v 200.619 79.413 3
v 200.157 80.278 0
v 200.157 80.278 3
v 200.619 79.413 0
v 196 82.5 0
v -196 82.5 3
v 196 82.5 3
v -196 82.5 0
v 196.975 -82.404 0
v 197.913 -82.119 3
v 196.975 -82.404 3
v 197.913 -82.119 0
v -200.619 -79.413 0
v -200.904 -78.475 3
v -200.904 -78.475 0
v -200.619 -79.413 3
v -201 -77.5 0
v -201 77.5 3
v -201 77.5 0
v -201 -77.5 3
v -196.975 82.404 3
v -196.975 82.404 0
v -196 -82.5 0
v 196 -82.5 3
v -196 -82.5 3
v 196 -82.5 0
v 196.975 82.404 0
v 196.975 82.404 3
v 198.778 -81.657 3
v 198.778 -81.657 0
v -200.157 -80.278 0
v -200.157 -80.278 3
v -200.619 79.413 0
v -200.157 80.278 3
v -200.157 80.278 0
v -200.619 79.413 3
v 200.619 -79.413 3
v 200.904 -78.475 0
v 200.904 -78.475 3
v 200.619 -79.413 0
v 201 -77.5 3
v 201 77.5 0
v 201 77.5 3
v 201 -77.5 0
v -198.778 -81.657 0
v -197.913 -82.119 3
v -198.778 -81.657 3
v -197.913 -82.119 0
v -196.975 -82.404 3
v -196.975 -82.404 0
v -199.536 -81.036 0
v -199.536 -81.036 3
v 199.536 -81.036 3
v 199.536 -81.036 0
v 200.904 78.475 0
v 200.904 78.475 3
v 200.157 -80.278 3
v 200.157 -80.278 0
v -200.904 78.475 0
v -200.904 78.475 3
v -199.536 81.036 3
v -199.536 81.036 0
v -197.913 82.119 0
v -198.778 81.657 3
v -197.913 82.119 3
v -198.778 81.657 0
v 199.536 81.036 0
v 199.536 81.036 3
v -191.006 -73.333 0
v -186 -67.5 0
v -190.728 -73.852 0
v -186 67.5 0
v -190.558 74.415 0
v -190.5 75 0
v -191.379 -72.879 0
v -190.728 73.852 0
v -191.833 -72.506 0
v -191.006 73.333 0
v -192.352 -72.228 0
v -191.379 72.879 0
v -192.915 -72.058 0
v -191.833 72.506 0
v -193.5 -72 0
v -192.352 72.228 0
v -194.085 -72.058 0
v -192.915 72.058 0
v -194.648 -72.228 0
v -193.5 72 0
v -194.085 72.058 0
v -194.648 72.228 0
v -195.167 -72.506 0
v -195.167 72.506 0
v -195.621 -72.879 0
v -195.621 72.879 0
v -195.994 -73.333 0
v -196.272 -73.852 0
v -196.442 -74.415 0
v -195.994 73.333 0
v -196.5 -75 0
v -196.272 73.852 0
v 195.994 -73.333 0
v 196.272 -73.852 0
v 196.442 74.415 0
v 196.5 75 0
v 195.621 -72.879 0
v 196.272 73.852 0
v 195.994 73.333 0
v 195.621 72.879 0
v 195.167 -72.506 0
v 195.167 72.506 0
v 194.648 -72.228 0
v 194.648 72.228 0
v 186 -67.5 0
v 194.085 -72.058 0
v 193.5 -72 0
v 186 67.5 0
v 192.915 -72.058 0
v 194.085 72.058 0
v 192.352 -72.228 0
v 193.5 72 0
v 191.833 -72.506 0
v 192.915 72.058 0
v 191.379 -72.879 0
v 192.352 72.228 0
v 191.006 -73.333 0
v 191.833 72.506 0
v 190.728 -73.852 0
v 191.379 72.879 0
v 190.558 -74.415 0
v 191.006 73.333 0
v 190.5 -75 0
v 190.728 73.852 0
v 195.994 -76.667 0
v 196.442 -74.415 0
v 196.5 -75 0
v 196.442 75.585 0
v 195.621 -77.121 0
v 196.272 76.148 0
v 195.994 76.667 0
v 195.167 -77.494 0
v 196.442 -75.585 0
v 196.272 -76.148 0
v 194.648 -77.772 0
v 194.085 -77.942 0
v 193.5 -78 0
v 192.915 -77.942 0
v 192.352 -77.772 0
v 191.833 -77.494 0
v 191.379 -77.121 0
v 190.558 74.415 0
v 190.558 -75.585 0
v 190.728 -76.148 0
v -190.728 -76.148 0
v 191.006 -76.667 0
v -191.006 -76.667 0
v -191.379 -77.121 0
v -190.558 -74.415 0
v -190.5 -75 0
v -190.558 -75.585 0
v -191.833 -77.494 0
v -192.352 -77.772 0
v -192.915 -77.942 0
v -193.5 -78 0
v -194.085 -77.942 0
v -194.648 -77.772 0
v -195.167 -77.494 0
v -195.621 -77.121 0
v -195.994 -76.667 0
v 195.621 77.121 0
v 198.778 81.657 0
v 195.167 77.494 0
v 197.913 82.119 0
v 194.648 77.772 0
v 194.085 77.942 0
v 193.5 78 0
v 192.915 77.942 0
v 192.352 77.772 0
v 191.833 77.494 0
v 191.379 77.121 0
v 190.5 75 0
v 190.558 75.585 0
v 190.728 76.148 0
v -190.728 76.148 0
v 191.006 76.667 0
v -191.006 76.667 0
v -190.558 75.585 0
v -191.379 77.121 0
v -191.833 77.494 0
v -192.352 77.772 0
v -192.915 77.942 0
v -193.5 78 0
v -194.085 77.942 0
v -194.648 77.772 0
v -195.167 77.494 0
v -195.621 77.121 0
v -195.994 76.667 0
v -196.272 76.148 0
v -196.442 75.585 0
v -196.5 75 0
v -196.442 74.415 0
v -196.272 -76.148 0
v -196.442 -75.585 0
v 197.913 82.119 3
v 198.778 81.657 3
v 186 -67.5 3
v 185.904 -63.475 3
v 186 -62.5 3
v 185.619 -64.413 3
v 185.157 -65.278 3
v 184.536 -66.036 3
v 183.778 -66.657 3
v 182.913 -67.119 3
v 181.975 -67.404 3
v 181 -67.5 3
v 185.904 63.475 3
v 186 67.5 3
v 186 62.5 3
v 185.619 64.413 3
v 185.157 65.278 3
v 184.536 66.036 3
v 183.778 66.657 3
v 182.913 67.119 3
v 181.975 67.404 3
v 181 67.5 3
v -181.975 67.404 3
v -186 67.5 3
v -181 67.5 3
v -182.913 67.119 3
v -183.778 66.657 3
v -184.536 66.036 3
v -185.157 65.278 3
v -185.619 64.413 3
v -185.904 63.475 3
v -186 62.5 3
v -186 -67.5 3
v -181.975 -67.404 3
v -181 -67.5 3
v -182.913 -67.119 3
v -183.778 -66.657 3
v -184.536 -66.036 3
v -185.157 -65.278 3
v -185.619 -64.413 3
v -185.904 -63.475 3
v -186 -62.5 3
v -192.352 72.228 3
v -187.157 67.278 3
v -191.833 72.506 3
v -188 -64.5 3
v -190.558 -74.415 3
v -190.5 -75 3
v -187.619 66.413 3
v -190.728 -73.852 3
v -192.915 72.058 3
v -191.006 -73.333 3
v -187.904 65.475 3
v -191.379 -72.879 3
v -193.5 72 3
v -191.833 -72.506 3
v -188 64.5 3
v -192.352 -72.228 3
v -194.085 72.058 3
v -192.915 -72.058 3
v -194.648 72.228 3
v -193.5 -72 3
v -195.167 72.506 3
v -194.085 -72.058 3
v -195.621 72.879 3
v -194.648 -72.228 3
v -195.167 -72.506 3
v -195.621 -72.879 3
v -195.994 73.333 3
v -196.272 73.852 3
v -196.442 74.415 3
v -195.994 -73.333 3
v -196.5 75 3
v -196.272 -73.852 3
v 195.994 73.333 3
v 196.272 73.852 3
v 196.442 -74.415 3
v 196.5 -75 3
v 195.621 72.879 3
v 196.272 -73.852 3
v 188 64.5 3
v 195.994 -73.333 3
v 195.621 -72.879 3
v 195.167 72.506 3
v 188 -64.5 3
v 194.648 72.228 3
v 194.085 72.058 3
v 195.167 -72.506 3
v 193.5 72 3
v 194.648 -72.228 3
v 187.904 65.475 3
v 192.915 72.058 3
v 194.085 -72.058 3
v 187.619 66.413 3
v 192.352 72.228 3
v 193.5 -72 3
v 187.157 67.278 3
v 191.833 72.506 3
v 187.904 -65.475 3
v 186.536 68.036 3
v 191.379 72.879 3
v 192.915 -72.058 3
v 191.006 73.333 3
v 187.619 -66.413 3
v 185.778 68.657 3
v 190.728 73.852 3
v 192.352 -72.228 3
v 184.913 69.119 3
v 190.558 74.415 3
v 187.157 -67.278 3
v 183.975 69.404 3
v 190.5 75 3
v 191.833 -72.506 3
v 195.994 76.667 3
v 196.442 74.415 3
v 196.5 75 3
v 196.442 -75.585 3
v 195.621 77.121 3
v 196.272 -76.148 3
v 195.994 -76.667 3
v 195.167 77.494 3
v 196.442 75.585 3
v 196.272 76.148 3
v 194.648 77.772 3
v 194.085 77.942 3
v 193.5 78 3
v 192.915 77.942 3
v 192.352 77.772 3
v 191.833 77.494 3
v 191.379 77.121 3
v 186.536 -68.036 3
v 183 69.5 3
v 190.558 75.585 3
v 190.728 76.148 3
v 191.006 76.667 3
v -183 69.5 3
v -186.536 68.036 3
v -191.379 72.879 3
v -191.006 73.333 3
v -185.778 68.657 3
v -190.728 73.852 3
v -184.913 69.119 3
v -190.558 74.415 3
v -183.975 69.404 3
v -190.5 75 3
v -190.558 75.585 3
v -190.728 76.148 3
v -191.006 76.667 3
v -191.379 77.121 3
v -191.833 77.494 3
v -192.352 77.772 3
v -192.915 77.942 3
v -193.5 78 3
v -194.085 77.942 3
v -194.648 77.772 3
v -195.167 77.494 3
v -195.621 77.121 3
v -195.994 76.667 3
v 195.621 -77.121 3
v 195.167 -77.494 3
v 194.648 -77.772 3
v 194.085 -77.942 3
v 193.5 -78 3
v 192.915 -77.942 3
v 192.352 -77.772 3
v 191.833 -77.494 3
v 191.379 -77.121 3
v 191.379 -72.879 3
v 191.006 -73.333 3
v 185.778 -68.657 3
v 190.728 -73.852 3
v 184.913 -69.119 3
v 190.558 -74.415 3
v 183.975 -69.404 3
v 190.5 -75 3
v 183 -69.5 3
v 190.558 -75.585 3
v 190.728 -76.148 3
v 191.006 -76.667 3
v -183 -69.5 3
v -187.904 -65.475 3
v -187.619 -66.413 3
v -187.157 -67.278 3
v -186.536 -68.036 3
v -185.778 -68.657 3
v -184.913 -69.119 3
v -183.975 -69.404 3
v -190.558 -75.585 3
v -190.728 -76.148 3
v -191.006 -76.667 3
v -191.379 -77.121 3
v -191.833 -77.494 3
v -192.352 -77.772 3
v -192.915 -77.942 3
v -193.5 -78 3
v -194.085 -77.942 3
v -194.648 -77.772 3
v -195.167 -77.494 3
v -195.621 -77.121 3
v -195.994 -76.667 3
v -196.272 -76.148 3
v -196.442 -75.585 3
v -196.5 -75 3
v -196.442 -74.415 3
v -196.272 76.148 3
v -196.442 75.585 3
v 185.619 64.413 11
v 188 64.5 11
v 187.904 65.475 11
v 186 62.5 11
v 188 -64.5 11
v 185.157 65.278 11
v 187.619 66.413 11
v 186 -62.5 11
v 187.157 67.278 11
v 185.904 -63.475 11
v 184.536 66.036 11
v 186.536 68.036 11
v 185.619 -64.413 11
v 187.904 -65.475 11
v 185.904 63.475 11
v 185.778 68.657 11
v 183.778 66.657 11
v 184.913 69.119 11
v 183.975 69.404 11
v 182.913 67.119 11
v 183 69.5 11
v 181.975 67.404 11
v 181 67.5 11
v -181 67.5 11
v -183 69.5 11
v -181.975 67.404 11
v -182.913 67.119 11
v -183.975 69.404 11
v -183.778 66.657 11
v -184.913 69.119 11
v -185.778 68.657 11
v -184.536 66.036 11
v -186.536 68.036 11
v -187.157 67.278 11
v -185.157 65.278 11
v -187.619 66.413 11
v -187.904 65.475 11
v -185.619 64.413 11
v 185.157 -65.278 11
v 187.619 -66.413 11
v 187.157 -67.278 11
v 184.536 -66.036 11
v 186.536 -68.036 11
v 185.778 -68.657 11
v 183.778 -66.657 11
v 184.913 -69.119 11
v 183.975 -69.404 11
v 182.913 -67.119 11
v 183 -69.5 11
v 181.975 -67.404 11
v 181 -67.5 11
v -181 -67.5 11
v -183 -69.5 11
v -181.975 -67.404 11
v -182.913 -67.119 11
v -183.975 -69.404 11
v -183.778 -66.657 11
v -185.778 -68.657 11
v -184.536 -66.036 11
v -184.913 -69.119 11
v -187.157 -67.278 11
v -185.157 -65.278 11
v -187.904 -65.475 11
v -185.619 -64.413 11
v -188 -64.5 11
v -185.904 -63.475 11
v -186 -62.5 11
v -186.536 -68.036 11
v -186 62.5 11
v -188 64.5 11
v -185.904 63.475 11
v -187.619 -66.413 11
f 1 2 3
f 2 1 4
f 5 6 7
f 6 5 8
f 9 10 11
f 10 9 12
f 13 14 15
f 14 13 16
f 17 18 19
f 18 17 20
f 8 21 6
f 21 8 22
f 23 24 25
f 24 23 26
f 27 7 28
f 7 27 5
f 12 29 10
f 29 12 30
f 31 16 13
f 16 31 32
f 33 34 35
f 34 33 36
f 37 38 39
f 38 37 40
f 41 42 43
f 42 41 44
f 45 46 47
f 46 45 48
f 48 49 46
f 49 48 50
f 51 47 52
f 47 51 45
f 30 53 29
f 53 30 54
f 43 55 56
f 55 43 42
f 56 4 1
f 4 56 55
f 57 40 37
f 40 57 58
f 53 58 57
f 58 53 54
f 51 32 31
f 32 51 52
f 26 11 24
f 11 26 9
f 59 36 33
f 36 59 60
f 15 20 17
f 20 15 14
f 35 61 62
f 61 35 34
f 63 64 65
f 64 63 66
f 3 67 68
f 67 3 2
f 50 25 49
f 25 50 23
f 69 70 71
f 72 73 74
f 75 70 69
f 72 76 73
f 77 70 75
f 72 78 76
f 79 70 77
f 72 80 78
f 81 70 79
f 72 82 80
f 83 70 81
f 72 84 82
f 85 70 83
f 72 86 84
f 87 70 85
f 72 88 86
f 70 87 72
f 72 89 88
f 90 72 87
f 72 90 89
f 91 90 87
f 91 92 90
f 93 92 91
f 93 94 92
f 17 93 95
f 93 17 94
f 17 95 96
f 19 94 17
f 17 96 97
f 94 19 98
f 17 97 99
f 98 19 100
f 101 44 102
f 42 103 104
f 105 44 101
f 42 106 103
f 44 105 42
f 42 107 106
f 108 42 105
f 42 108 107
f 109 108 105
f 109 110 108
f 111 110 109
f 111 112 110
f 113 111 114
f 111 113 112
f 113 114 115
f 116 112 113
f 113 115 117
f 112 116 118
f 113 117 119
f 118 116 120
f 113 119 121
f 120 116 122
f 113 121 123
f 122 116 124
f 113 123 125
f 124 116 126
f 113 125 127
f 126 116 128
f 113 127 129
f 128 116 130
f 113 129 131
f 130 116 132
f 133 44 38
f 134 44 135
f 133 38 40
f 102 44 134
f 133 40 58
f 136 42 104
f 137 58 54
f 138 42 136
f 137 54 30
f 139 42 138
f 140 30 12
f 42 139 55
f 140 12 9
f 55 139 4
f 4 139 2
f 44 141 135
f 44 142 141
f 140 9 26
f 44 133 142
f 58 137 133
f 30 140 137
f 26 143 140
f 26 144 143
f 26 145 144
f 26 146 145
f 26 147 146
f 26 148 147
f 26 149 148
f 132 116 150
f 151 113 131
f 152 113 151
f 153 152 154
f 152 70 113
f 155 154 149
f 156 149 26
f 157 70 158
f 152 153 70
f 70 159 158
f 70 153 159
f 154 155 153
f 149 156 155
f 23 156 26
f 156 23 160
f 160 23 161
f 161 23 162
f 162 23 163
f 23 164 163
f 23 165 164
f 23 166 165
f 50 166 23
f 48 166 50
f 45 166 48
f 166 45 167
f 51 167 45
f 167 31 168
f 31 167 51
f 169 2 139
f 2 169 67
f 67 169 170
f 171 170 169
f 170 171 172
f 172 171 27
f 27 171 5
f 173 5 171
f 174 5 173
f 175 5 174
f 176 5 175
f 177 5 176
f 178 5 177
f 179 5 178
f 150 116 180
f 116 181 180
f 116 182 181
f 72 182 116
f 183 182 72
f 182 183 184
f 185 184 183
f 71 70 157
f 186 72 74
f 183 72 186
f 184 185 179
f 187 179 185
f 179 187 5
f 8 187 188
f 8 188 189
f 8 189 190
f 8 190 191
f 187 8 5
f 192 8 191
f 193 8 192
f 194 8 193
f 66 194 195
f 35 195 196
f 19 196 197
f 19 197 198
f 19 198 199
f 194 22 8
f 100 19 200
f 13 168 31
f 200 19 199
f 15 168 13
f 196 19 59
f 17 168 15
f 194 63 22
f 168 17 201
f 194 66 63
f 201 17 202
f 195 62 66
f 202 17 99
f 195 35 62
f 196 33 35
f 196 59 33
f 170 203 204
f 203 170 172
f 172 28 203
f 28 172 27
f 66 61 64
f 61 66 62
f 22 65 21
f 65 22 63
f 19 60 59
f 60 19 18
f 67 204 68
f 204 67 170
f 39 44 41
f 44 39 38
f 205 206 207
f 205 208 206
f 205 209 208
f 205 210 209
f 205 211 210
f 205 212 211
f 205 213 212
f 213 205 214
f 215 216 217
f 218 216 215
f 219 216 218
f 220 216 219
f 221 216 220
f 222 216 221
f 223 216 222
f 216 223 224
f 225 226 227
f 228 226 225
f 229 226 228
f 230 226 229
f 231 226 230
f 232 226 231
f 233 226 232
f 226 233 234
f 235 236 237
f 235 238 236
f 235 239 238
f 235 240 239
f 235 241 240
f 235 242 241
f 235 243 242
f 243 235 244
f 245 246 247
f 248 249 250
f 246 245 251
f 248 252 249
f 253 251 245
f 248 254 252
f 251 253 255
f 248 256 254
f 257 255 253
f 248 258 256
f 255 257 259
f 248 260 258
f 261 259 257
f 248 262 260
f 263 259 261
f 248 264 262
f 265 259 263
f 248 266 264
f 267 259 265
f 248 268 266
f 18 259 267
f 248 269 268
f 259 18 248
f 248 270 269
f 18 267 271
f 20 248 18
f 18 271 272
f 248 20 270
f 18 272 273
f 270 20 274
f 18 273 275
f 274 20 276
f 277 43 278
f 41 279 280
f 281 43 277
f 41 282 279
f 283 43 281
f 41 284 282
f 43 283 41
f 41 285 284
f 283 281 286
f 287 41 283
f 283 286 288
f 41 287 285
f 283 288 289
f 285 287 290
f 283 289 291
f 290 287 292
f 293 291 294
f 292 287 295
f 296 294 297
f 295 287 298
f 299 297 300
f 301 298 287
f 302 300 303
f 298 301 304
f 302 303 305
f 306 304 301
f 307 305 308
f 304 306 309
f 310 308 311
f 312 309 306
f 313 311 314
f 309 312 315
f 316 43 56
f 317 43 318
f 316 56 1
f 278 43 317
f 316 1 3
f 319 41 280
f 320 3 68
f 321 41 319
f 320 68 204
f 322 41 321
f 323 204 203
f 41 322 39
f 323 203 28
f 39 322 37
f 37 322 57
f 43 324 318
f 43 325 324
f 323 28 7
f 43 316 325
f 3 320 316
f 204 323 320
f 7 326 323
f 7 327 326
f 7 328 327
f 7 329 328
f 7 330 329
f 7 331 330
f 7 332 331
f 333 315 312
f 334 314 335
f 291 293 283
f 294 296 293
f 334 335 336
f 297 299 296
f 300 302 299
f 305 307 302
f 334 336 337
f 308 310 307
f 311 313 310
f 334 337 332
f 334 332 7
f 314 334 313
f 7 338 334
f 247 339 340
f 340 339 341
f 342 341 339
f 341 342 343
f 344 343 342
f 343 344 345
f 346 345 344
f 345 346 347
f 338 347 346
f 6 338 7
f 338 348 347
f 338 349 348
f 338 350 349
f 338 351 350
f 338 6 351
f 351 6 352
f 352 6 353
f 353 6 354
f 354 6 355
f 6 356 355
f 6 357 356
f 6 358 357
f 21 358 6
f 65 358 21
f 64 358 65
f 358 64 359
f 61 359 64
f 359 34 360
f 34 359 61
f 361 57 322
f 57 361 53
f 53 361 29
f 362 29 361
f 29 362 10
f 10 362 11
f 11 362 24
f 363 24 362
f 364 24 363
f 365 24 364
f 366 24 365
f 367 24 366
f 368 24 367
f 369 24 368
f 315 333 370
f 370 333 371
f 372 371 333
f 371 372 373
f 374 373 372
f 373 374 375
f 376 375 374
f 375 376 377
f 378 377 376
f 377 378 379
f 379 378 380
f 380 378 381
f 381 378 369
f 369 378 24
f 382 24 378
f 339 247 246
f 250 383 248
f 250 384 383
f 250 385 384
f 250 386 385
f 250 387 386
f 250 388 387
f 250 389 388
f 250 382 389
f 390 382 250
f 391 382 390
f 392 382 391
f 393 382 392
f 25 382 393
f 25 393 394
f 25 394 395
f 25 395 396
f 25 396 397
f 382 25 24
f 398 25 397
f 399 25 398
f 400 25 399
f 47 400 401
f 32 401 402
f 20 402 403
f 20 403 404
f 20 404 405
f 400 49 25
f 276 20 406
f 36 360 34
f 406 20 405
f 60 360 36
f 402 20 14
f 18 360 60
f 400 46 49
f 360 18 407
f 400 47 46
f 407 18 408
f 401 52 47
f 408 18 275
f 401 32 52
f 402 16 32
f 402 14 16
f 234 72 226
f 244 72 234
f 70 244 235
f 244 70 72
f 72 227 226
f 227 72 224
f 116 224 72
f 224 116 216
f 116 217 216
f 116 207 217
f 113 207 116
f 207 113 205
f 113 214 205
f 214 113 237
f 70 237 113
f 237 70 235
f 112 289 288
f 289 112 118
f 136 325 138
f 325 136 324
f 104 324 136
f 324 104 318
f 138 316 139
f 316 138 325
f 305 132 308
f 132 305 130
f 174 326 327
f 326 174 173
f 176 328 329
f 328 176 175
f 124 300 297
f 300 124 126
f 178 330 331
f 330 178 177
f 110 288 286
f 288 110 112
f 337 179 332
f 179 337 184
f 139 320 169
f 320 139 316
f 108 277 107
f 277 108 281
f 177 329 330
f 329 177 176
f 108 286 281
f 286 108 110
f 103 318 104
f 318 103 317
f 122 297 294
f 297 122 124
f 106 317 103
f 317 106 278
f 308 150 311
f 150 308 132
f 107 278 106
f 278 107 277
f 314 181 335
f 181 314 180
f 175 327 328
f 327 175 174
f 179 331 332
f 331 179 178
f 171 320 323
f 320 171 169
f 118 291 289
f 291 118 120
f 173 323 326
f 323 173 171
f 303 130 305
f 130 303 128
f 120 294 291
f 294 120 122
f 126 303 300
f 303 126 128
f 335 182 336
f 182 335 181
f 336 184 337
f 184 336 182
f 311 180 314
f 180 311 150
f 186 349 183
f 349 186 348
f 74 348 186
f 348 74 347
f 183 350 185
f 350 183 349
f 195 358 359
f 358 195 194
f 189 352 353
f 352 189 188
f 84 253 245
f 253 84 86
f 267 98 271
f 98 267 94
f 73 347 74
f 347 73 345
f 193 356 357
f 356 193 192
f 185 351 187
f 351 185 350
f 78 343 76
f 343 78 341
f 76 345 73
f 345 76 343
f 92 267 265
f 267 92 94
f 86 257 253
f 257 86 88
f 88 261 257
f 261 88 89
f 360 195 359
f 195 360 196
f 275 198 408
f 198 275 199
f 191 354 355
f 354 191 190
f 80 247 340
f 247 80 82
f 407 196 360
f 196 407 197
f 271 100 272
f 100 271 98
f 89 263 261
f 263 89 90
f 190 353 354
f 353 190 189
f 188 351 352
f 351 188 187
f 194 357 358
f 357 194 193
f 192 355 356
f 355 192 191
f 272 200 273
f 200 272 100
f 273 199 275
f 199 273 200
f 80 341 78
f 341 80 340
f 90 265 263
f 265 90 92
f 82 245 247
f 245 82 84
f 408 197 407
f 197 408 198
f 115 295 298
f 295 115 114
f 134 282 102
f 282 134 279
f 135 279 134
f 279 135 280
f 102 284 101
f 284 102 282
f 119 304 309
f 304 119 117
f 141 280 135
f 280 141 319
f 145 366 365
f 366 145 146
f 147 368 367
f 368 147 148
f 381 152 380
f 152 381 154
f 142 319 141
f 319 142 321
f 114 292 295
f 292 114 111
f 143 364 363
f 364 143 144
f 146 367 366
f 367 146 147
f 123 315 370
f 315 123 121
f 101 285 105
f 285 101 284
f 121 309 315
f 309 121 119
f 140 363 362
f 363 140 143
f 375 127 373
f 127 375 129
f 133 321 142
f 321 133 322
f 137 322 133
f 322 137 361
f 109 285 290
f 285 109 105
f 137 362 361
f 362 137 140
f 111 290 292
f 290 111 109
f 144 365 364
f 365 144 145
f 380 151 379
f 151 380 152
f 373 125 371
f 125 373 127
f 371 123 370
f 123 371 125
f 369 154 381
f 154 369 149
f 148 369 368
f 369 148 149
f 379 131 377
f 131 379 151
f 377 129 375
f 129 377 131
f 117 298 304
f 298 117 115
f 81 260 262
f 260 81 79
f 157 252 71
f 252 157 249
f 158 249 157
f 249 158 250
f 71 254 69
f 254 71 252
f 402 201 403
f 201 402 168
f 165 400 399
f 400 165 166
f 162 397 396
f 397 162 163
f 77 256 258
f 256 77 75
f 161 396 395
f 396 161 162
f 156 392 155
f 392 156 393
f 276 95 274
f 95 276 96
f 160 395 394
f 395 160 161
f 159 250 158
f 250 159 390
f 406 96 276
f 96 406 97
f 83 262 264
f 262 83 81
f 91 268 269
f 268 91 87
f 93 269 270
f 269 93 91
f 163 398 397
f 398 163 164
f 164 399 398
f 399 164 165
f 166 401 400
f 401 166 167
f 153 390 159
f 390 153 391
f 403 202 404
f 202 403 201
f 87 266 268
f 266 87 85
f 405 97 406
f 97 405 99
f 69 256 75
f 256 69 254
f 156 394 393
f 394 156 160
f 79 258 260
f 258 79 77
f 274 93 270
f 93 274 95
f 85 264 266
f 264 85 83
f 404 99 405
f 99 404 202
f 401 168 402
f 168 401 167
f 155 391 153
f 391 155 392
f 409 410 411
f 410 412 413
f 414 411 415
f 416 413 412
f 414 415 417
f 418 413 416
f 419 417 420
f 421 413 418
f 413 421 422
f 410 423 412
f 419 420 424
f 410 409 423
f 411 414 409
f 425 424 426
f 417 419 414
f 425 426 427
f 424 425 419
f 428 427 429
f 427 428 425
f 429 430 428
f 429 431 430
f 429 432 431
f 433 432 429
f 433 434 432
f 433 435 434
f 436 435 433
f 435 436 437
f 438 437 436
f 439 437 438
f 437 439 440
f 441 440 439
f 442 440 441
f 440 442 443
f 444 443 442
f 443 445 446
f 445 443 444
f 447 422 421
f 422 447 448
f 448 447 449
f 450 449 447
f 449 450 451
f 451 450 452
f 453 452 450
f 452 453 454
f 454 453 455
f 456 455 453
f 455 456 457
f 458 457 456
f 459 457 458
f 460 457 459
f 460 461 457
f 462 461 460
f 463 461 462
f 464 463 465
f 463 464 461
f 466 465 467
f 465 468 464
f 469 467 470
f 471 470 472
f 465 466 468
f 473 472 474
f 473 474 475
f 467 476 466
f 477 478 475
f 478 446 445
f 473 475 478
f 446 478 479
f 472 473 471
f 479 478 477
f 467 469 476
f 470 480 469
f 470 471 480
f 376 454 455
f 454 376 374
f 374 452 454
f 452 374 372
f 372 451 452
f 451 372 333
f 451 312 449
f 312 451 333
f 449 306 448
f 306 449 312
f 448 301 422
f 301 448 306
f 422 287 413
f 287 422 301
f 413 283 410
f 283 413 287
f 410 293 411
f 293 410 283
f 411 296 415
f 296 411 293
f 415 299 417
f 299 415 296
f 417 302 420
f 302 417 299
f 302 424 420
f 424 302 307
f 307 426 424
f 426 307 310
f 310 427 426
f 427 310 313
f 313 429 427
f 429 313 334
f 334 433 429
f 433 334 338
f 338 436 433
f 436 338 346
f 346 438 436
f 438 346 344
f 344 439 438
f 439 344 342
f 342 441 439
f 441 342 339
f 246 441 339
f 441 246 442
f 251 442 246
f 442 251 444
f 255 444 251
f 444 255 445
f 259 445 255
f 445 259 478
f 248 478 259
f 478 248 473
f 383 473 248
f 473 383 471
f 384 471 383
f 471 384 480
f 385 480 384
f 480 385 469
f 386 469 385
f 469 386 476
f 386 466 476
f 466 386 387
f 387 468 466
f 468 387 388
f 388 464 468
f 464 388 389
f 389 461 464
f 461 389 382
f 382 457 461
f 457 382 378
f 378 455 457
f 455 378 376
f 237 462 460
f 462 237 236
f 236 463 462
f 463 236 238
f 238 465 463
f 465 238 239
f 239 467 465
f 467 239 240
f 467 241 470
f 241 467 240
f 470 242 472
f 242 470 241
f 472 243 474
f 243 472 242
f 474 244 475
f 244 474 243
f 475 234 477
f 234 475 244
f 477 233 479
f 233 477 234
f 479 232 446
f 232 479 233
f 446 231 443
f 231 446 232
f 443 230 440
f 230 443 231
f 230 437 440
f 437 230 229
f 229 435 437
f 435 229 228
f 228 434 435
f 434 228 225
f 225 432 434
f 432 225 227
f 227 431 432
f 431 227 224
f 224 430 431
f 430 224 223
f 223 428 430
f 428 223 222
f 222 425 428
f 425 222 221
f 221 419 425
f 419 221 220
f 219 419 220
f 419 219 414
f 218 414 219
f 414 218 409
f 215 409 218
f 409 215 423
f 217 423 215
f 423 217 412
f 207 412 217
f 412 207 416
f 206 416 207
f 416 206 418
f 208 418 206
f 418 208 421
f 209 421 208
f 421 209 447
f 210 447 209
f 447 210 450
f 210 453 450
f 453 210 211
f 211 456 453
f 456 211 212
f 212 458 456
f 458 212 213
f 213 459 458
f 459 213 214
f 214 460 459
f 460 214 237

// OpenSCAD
// ============================================================================
// License Plate Frame
// Purpose: Custom license plate mounting frame
// Units: millimetres (mm)
// ============================================================================

/* ----------------------------- USER PARAMETERS -------------------------------- */
plate_width = 372;          // license plate width (standard 372mm)
plate_height = 135;         // license plate height (standard 135mm)
frame_border = 15;          // frame border width (mm)
frame_thickness = 3;        // frame thickness (mm)
mounting_hole_diameter = 6;  // mounting hole diameter (mm)
corner_radius = 5;          // corner rounding (mm)
back_support_height = 8;    // rear support lip height (mm)

/* ------------------------- Assertions & Limits ---------------------------- */
assert(plate_width > 0 && plate_height > 0, "Plate dimensions must be > 0");
assert(frame_border >= 5, "Frame border should be ≥ 5mm");
assert(frame_thickness >= 2, "Frame thickness should be ≥ 2mm");

/* ------------------------- Derived Measurements --------------------------- */
total_width = plate_width + 2*frame_border;
total_height = plate_height + 2*frame_border;
cutout_width = plate_width;
cutout_height = plate_height;

/* ------------------------------ Modules ---------------------------------- */
module rounded_rect(w, h, r) {
    if (r > 0) {
        minkowski() {
            square([w - 2*r, h - 2*r], center=true);
            circle(r=r, $fn=32);
        }
    } else {
        square([w, h], center=true);
    }
}

module license_plate_frame() {
    difference() {
        // Main frame
        linear_extrude(frame_thickness) {
            rounded_rect(total_width, total_height, corner_radius);
        }
        
        // License plate cutout
        translate([0, 0, -0.5]) {
            linear_extrude(frame_thickness + 1) {
                rounded_rect(cutout_width, cutout_height, max(0, corner_radius - frame_border/2));
            }
        }
        
        // Mounting holes - top corners
        translate([total_width/2 - frame_border/2, total_height/2 - frame_border/2, -0.5]) {
            cylinder(d=mounting_hole_diameter, h=frame_thickness + 1, $fn=32);
        }
        translate([-total_width/2 + frame_border/2, total_height/2 - frame_border/2, -0.5]) {
            cylinder(d=mounting_hole_diameter, h=frame_thickness + 1, $fn=32);
        }
        
        // Mounting holes - bottom corners
        translate([total_width/2 - frame_border/2, -total_height/2 + frame_border/2, -0.5]) {
            cylinder(d=mounting_hole_diameter, h=frame_thickness + 1, $fn=32);
        }
        translate([-total_width/2 + frame_border/2, -total_height/2 + frame_border/2, -0.5]) {
            cylinder(d=mounting_hole_diameter, h=frame_thickness + 1, $fn=32);
        }
    }
    
    // Back support lip
    if (back_support_height > 0) {
        translate([0, 0, frame_thickness]) {
            difference() {
                linear_extrude(back_support_height) {
                    difference() {
                        rounded_rect(cutout_width + 4, cutout_height + 4, corner_radius);
                        rounded_rect(cutout_width, cutout_height, corner_radius);
                    }
                }
            }
        }
    }
}

/* --------------------------------- Call ---------------------------------- */
license_plate_frame();

/* ============================== HOW TO PRINT / ORIENT ============================== */
// Print orientation: Face down on build plate
// Supports: None needed
// Layer height: 0.2-0.3mm
// Infill: 20-25% for durability
// Print speed: Normal (50mm/s)
// Post-processing: Light deburring of mounting holes
